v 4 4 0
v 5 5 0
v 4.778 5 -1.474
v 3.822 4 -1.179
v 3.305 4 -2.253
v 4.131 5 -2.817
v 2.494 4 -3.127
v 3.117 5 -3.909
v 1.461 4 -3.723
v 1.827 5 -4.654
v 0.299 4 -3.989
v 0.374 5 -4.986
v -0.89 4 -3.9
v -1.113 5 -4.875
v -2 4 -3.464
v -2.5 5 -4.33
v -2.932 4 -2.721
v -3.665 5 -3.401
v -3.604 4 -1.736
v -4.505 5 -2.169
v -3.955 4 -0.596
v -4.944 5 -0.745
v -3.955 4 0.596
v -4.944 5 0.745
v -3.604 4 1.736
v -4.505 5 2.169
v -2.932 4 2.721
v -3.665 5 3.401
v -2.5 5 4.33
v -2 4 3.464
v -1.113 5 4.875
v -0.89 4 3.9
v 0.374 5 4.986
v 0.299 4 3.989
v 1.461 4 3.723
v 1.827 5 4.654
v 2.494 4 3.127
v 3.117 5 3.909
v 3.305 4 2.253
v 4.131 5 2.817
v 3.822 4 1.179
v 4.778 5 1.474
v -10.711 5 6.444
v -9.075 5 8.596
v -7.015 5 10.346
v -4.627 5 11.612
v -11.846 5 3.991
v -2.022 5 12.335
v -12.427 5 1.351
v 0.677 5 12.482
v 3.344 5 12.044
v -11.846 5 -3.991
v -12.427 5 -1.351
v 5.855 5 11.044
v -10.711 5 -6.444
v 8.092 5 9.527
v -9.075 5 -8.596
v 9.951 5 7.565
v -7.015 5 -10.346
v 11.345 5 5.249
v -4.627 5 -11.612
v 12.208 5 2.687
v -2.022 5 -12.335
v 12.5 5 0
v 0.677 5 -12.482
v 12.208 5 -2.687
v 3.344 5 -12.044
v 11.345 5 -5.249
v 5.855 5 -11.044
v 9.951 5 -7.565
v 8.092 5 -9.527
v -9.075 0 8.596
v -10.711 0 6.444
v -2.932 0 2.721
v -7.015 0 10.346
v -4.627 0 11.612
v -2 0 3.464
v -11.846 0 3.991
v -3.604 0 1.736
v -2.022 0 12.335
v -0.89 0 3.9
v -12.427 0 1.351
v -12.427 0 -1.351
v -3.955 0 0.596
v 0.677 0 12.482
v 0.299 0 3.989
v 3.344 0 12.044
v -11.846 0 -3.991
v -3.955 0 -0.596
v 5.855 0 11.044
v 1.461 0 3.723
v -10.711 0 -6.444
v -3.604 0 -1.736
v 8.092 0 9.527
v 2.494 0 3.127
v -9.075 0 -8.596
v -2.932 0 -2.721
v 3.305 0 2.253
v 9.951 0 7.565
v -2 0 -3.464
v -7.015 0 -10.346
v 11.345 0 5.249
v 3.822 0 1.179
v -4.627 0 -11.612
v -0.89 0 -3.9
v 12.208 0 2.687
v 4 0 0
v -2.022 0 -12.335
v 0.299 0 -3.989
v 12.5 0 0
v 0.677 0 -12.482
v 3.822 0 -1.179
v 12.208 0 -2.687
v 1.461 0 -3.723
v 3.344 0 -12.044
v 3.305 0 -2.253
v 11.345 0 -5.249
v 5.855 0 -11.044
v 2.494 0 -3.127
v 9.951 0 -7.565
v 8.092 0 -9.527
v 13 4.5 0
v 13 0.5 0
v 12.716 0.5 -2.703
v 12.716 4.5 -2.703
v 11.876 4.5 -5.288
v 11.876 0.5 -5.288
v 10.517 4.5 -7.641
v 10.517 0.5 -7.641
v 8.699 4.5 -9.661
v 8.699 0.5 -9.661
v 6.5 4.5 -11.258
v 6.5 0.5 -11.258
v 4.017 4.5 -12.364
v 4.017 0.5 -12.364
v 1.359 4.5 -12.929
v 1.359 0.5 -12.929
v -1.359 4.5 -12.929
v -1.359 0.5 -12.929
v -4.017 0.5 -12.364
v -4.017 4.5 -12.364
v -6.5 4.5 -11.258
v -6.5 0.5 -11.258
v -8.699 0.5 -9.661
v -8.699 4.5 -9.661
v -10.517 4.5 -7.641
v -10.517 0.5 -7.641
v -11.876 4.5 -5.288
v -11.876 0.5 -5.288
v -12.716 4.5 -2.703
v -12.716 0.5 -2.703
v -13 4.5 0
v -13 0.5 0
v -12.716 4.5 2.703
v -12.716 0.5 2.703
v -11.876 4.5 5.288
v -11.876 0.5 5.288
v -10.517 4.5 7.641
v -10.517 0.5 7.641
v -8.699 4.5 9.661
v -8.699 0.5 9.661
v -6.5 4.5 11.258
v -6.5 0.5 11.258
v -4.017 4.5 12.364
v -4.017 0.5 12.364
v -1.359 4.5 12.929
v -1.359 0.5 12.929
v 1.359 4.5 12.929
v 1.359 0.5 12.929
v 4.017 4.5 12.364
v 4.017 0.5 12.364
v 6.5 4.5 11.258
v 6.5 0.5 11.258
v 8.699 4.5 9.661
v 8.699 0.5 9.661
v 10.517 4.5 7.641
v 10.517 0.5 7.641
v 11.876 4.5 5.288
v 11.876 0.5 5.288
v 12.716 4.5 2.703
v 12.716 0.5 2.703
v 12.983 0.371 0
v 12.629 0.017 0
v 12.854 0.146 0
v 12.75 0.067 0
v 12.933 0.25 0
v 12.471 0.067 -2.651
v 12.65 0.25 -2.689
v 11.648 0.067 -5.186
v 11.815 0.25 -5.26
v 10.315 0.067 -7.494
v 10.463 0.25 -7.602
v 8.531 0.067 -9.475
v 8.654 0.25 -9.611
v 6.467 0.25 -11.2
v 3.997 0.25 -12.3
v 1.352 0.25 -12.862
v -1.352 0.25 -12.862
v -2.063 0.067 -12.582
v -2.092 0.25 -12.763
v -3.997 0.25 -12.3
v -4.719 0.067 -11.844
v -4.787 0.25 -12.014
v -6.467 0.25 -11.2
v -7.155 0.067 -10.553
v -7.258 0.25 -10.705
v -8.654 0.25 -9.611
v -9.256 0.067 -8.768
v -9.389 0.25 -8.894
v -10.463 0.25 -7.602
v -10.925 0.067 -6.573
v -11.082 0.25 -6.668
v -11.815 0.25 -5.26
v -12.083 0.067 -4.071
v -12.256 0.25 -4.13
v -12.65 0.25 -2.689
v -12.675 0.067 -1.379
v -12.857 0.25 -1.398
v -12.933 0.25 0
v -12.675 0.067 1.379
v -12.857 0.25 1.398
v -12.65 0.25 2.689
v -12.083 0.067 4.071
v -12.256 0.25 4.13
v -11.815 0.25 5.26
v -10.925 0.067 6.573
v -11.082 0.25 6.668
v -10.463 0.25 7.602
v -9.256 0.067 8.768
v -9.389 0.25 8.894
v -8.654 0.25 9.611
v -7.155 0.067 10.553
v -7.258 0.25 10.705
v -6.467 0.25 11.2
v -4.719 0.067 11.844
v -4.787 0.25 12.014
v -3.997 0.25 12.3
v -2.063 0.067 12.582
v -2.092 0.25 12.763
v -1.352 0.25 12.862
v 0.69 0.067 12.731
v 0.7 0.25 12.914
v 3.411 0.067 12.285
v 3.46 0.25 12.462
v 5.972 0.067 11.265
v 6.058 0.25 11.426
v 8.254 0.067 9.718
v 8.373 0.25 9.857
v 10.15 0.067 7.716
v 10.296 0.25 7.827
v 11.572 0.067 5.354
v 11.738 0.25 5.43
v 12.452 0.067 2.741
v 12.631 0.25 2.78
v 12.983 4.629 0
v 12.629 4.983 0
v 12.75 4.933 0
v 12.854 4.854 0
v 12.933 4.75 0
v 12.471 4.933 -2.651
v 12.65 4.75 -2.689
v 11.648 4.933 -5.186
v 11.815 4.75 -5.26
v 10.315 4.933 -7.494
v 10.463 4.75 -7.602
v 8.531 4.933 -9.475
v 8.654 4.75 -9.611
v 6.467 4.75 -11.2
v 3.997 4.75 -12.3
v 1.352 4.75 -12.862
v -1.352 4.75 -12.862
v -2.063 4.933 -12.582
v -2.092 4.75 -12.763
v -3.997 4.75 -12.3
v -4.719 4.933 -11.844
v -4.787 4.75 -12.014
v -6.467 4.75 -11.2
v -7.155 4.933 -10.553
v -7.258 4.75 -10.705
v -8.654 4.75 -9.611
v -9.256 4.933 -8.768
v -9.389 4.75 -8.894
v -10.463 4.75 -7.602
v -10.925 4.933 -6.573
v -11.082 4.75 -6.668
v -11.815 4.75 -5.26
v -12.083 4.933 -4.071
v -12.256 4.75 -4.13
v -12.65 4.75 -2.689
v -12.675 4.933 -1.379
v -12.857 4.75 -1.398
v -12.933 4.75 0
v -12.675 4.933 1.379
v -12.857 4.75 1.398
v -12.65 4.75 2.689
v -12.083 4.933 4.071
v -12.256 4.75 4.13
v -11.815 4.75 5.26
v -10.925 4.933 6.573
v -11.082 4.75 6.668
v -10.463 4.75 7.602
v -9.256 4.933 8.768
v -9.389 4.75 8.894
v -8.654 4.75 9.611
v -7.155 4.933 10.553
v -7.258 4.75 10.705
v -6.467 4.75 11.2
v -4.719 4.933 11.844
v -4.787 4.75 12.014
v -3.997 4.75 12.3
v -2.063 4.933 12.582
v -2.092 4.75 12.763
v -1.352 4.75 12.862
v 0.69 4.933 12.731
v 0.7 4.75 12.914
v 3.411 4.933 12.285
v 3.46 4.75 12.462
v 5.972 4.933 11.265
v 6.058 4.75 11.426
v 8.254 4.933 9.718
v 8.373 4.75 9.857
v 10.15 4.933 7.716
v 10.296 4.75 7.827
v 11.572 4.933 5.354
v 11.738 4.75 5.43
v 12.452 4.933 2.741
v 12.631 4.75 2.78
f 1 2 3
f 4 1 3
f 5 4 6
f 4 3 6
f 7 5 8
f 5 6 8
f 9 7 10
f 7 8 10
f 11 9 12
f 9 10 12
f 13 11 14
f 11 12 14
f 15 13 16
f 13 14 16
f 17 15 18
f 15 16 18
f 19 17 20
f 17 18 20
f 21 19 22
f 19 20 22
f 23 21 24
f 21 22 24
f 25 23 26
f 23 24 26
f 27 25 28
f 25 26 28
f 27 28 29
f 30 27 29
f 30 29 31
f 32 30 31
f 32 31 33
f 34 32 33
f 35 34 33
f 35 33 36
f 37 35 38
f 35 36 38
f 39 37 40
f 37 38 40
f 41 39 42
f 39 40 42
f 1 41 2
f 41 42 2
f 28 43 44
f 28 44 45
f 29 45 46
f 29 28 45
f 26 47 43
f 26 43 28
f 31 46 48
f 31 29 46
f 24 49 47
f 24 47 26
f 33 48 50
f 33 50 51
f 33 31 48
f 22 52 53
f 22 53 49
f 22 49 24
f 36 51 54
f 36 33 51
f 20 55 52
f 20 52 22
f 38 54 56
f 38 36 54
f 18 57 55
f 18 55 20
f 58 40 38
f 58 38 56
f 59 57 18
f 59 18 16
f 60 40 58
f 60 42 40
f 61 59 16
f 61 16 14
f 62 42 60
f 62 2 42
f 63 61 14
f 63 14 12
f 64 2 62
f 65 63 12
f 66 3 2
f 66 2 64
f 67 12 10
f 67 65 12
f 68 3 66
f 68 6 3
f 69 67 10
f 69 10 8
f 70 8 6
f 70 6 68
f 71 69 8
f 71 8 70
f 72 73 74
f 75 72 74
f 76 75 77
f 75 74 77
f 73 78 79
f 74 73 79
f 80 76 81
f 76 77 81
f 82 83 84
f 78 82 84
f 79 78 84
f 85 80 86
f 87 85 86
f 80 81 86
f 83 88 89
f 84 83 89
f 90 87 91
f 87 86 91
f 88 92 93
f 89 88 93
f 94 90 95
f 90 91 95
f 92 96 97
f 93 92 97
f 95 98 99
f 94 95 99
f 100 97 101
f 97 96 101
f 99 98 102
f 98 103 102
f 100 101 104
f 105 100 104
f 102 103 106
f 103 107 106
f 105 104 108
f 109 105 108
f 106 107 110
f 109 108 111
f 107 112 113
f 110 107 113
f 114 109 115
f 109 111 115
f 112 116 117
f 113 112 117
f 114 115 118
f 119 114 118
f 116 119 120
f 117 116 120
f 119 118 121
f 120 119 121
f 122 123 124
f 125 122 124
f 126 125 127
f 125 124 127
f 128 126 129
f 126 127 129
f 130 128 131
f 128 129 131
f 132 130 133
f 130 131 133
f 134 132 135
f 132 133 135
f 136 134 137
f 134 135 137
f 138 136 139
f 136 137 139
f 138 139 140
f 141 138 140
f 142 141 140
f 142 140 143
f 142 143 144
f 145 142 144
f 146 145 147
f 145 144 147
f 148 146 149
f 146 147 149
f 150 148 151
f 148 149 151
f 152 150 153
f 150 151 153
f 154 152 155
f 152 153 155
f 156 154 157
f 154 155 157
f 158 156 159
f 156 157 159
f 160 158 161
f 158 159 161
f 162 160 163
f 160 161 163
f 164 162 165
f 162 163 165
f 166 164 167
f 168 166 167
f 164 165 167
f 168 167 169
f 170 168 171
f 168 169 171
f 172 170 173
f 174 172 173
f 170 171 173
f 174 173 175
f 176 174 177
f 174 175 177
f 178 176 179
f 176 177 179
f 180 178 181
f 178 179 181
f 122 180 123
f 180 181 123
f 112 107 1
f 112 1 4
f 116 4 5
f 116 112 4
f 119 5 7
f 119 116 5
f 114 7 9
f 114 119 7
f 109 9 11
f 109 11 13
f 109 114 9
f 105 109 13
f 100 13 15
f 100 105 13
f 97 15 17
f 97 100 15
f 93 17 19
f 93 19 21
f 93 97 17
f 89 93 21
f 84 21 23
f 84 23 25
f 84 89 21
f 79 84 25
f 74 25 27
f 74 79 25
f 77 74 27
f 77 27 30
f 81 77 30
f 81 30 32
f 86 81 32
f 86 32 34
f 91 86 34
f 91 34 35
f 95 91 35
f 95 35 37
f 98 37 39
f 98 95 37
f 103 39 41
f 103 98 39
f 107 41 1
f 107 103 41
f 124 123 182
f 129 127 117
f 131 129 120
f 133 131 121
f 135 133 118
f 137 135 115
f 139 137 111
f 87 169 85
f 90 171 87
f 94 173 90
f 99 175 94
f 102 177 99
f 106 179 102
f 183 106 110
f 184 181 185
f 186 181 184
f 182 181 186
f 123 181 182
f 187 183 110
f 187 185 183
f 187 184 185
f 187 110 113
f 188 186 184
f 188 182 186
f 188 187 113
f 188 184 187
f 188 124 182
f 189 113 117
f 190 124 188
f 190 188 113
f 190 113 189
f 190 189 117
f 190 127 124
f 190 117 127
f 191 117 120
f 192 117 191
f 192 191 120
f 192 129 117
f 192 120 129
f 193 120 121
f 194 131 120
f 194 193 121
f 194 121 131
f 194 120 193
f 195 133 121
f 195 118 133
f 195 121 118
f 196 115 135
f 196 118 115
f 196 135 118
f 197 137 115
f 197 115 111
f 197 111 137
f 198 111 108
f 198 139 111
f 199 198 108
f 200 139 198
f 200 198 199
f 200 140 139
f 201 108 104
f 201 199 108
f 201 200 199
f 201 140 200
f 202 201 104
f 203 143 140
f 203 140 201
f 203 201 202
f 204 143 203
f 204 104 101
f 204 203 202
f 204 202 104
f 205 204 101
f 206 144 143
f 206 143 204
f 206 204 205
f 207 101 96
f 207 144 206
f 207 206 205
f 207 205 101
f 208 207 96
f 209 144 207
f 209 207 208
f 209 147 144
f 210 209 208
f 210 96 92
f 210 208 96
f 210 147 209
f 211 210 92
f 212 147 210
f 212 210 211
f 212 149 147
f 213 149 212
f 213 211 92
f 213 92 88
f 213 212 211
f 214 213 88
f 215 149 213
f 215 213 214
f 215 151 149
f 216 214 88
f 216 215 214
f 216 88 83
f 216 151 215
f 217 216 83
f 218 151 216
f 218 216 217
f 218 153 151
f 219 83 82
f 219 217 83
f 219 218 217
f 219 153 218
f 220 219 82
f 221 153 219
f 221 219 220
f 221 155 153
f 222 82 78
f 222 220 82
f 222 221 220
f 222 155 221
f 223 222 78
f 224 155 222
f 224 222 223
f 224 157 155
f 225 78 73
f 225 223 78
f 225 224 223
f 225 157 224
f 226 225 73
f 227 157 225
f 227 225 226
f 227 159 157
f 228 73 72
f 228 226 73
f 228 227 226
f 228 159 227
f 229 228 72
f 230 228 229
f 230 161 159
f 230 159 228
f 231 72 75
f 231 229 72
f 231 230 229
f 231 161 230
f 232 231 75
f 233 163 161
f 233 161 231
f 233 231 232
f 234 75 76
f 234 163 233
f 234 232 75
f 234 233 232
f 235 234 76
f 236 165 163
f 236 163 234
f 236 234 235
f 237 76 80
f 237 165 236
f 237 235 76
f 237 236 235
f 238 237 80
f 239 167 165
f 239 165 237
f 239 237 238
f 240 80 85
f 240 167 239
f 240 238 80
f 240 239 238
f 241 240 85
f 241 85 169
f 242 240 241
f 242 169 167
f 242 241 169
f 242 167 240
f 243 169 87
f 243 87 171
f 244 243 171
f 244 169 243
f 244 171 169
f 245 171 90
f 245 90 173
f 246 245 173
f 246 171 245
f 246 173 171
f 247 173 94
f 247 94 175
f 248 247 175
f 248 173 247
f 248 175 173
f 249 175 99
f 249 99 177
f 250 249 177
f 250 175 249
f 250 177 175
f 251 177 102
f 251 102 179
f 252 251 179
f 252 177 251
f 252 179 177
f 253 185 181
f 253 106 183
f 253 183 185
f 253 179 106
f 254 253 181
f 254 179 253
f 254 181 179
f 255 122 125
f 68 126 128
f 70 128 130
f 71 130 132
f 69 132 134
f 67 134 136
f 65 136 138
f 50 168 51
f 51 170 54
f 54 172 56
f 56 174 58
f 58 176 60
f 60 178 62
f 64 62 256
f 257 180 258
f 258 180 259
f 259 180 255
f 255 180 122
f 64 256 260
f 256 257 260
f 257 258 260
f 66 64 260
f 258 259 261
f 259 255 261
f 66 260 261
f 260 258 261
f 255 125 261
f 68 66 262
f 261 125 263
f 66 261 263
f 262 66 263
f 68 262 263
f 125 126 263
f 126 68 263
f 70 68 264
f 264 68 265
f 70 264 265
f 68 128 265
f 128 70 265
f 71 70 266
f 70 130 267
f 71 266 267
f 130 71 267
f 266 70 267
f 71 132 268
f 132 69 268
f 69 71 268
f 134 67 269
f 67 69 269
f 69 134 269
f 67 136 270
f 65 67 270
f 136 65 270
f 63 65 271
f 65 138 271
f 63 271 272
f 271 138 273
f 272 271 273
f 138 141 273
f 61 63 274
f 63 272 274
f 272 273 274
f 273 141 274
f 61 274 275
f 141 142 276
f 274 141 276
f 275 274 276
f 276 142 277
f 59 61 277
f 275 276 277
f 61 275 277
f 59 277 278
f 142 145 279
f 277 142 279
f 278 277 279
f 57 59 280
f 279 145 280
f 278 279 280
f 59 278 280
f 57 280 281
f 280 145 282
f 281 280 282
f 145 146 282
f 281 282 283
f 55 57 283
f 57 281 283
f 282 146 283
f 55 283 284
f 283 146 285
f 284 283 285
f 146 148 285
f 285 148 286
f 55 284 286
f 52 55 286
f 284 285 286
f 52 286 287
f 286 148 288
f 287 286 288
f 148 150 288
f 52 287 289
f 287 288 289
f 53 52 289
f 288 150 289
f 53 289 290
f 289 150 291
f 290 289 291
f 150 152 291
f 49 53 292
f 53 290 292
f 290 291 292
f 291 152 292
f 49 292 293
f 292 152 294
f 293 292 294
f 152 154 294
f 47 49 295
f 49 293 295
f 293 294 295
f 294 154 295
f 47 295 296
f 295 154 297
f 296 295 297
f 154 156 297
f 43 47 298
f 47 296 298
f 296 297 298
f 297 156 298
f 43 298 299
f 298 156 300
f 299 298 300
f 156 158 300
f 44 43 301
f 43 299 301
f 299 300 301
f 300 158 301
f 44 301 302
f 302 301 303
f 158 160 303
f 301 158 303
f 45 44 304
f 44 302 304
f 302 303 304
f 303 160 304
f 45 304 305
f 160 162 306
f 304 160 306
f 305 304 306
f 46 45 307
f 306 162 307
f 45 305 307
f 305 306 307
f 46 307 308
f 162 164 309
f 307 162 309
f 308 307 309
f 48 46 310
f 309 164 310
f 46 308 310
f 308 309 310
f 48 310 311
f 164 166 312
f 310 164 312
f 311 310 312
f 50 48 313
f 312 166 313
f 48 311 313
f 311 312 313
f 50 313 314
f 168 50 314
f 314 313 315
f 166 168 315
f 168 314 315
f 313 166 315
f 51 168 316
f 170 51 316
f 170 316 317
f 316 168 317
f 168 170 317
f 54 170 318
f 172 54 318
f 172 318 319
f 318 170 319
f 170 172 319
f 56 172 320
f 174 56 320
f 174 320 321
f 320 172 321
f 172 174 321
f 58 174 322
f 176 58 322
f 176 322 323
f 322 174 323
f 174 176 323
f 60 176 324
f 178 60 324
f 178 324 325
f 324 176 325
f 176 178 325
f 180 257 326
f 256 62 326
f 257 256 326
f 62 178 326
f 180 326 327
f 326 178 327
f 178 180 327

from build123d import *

# Parameters (mm, degrees)
SKETCH1_R           = 13
SKETCH1_R_2         = 4
BOSS_EXTRUDE1_DEPTH = 5
CHAMFER1_SIZE       = 1
FILLET1_R           = 0.5


with BuildPart() as part:
    # Sketch1 → Boss-Extrude1 (new body)
    with BuildSketch(Plane(origin=(0, 0, 0), x_dir=(1, 0, 0), z_dir=(0, 1, 0))):
        Circle(SKETCH1_R)
        Circle(SKETCH1_R_2, mode=Mode.SUBTRACT)
    extrude(amount=BOSS_EXTRUDE1_DEPTH)

    # Chamfer1
    chamfer1_edges = [part.edges().sort_by_distance(p)[0] for p in [
        (-4, 5, 0),
    ]]
    chamfer(chamfer1_edges, length=CHAMFER1_SIZE)

    # Fillet1
    fillet1_edges = [part.edges().sort_by_distance(p)[0] for p in [
        (-13, 0, 0),
        (-13, 5, 0),
    ]]
    fillet(fillet1_edges, radius=FILLET1_R)


solid = part.part
